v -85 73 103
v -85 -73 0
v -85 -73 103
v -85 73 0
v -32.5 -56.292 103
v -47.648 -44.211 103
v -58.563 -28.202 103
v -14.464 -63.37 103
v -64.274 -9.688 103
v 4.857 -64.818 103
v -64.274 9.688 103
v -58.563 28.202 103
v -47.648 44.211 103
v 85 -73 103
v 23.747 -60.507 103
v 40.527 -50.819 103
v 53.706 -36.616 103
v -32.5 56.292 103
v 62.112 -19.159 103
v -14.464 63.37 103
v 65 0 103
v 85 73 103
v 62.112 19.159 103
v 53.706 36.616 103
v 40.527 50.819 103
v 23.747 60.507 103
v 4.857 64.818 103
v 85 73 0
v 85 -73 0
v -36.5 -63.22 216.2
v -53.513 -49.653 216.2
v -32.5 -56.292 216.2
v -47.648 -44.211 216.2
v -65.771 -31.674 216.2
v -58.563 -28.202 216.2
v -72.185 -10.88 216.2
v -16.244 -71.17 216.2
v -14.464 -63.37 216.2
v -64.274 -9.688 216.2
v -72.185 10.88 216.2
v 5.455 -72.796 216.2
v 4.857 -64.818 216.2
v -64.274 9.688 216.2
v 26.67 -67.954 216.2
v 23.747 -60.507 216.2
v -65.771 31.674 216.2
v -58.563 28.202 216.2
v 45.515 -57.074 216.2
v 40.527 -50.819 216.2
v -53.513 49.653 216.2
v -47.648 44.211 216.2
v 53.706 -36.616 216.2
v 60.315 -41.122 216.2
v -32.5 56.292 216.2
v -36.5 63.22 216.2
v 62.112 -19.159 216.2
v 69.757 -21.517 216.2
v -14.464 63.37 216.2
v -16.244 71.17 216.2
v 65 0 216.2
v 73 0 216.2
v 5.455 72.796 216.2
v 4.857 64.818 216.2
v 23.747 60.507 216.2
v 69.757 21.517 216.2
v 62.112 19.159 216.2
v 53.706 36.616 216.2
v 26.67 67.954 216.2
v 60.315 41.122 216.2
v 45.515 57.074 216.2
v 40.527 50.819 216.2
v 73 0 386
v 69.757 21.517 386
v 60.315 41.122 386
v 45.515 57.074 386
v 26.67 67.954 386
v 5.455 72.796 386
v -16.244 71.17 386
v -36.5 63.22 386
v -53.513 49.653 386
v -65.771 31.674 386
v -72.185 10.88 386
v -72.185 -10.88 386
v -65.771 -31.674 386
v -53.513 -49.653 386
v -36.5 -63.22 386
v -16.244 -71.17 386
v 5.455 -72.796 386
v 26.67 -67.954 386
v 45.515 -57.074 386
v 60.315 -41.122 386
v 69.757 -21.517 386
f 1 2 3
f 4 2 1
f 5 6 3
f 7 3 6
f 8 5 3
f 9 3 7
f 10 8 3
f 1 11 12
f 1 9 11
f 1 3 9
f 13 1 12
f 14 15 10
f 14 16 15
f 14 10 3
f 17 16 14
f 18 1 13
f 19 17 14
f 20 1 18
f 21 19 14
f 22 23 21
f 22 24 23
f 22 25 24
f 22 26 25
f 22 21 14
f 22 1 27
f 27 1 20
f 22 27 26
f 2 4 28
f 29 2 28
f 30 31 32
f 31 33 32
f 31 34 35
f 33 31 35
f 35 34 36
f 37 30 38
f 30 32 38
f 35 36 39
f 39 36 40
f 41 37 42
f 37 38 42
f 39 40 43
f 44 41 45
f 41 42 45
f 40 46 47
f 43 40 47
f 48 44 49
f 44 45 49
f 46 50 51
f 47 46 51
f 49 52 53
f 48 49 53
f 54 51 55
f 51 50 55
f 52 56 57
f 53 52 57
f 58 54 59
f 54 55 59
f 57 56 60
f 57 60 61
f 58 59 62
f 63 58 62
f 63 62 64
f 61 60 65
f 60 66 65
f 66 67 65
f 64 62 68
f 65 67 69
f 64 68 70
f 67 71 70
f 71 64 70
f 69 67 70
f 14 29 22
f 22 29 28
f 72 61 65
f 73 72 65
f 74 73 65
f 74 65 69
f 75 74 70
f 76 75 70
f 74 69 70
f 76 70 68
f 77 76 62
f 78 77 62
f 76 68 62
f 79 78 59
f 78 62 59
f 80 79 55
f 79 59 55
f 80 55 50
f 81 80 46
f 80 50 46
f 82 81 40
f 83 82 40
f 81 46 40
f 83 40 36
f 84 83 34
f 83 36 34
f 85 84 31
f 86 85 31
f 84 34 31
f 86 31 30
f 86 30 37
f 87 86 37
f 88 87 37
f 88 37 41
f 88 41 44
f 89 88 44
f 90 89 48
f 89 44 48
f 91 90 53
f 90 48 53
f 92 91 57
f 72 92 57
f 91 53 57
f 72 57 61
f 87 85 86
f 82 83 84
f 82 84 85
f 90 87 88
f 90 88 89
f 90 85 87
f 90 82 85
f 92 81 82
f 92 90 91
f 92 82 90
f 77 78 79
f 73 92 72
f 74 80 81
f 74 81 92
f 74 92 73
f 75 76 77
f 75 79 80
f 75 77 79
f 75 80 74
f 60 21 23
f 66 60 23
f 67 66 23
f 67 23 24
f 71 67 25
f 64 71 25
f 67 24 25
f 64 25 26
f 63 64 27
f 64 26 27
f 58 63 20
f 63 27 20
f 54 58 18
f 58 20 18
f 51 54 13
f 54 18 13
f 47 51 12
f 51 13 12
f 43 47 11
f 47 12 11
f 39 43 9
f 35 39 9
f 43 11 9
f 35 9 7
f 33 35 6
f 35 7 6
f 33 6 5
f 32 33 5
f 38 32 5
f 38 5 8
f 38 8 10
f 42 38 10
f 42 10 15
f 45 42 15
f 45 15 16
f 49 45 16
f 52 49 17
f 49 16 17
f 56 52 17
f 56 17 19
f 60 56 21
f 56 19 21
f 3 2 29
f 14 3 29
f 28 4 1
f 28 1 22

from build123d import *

# Parameters (mm, degrees)
SKETCH1_W           = 170
SKETCH1_H           = 146
BOSS_EXTRUDE1_DEPTH = 103
SKETCH2_R           = 65
BOSS_EXTRUDE2_DEPTH = 113.2
SKETCH3_R           = 73
BOSS_EXTRUDE3_DEPTH = 169.8


with BuildPart() as part:
    # Sketch1 → Boss-Extrude1 (new body)
    with BuildSketch(Plane.XY):
        Rectangle(SKETCH1_W, SKETCH1_H)
    extrude(amount=BOSS_EXTRUDE1_DEPTH)

    # Sketch2 → Boss-Extrude2 (add)
    with BuildSketch(Plane.XY.offset(103)):
        Circle(SKETCH2_R)
    extrude(amount=BOSS_EXTRUDE2_DEPTH)

    # Sketch3 → Boss-Extrude3 (add)
    with BuildSketch(Plane.XY.offset(216.2)):
        Circle(SKETCH3_R)
    extrude(amount=BOSS_EXTRUDE3_DEPTH)


solid = part.part
